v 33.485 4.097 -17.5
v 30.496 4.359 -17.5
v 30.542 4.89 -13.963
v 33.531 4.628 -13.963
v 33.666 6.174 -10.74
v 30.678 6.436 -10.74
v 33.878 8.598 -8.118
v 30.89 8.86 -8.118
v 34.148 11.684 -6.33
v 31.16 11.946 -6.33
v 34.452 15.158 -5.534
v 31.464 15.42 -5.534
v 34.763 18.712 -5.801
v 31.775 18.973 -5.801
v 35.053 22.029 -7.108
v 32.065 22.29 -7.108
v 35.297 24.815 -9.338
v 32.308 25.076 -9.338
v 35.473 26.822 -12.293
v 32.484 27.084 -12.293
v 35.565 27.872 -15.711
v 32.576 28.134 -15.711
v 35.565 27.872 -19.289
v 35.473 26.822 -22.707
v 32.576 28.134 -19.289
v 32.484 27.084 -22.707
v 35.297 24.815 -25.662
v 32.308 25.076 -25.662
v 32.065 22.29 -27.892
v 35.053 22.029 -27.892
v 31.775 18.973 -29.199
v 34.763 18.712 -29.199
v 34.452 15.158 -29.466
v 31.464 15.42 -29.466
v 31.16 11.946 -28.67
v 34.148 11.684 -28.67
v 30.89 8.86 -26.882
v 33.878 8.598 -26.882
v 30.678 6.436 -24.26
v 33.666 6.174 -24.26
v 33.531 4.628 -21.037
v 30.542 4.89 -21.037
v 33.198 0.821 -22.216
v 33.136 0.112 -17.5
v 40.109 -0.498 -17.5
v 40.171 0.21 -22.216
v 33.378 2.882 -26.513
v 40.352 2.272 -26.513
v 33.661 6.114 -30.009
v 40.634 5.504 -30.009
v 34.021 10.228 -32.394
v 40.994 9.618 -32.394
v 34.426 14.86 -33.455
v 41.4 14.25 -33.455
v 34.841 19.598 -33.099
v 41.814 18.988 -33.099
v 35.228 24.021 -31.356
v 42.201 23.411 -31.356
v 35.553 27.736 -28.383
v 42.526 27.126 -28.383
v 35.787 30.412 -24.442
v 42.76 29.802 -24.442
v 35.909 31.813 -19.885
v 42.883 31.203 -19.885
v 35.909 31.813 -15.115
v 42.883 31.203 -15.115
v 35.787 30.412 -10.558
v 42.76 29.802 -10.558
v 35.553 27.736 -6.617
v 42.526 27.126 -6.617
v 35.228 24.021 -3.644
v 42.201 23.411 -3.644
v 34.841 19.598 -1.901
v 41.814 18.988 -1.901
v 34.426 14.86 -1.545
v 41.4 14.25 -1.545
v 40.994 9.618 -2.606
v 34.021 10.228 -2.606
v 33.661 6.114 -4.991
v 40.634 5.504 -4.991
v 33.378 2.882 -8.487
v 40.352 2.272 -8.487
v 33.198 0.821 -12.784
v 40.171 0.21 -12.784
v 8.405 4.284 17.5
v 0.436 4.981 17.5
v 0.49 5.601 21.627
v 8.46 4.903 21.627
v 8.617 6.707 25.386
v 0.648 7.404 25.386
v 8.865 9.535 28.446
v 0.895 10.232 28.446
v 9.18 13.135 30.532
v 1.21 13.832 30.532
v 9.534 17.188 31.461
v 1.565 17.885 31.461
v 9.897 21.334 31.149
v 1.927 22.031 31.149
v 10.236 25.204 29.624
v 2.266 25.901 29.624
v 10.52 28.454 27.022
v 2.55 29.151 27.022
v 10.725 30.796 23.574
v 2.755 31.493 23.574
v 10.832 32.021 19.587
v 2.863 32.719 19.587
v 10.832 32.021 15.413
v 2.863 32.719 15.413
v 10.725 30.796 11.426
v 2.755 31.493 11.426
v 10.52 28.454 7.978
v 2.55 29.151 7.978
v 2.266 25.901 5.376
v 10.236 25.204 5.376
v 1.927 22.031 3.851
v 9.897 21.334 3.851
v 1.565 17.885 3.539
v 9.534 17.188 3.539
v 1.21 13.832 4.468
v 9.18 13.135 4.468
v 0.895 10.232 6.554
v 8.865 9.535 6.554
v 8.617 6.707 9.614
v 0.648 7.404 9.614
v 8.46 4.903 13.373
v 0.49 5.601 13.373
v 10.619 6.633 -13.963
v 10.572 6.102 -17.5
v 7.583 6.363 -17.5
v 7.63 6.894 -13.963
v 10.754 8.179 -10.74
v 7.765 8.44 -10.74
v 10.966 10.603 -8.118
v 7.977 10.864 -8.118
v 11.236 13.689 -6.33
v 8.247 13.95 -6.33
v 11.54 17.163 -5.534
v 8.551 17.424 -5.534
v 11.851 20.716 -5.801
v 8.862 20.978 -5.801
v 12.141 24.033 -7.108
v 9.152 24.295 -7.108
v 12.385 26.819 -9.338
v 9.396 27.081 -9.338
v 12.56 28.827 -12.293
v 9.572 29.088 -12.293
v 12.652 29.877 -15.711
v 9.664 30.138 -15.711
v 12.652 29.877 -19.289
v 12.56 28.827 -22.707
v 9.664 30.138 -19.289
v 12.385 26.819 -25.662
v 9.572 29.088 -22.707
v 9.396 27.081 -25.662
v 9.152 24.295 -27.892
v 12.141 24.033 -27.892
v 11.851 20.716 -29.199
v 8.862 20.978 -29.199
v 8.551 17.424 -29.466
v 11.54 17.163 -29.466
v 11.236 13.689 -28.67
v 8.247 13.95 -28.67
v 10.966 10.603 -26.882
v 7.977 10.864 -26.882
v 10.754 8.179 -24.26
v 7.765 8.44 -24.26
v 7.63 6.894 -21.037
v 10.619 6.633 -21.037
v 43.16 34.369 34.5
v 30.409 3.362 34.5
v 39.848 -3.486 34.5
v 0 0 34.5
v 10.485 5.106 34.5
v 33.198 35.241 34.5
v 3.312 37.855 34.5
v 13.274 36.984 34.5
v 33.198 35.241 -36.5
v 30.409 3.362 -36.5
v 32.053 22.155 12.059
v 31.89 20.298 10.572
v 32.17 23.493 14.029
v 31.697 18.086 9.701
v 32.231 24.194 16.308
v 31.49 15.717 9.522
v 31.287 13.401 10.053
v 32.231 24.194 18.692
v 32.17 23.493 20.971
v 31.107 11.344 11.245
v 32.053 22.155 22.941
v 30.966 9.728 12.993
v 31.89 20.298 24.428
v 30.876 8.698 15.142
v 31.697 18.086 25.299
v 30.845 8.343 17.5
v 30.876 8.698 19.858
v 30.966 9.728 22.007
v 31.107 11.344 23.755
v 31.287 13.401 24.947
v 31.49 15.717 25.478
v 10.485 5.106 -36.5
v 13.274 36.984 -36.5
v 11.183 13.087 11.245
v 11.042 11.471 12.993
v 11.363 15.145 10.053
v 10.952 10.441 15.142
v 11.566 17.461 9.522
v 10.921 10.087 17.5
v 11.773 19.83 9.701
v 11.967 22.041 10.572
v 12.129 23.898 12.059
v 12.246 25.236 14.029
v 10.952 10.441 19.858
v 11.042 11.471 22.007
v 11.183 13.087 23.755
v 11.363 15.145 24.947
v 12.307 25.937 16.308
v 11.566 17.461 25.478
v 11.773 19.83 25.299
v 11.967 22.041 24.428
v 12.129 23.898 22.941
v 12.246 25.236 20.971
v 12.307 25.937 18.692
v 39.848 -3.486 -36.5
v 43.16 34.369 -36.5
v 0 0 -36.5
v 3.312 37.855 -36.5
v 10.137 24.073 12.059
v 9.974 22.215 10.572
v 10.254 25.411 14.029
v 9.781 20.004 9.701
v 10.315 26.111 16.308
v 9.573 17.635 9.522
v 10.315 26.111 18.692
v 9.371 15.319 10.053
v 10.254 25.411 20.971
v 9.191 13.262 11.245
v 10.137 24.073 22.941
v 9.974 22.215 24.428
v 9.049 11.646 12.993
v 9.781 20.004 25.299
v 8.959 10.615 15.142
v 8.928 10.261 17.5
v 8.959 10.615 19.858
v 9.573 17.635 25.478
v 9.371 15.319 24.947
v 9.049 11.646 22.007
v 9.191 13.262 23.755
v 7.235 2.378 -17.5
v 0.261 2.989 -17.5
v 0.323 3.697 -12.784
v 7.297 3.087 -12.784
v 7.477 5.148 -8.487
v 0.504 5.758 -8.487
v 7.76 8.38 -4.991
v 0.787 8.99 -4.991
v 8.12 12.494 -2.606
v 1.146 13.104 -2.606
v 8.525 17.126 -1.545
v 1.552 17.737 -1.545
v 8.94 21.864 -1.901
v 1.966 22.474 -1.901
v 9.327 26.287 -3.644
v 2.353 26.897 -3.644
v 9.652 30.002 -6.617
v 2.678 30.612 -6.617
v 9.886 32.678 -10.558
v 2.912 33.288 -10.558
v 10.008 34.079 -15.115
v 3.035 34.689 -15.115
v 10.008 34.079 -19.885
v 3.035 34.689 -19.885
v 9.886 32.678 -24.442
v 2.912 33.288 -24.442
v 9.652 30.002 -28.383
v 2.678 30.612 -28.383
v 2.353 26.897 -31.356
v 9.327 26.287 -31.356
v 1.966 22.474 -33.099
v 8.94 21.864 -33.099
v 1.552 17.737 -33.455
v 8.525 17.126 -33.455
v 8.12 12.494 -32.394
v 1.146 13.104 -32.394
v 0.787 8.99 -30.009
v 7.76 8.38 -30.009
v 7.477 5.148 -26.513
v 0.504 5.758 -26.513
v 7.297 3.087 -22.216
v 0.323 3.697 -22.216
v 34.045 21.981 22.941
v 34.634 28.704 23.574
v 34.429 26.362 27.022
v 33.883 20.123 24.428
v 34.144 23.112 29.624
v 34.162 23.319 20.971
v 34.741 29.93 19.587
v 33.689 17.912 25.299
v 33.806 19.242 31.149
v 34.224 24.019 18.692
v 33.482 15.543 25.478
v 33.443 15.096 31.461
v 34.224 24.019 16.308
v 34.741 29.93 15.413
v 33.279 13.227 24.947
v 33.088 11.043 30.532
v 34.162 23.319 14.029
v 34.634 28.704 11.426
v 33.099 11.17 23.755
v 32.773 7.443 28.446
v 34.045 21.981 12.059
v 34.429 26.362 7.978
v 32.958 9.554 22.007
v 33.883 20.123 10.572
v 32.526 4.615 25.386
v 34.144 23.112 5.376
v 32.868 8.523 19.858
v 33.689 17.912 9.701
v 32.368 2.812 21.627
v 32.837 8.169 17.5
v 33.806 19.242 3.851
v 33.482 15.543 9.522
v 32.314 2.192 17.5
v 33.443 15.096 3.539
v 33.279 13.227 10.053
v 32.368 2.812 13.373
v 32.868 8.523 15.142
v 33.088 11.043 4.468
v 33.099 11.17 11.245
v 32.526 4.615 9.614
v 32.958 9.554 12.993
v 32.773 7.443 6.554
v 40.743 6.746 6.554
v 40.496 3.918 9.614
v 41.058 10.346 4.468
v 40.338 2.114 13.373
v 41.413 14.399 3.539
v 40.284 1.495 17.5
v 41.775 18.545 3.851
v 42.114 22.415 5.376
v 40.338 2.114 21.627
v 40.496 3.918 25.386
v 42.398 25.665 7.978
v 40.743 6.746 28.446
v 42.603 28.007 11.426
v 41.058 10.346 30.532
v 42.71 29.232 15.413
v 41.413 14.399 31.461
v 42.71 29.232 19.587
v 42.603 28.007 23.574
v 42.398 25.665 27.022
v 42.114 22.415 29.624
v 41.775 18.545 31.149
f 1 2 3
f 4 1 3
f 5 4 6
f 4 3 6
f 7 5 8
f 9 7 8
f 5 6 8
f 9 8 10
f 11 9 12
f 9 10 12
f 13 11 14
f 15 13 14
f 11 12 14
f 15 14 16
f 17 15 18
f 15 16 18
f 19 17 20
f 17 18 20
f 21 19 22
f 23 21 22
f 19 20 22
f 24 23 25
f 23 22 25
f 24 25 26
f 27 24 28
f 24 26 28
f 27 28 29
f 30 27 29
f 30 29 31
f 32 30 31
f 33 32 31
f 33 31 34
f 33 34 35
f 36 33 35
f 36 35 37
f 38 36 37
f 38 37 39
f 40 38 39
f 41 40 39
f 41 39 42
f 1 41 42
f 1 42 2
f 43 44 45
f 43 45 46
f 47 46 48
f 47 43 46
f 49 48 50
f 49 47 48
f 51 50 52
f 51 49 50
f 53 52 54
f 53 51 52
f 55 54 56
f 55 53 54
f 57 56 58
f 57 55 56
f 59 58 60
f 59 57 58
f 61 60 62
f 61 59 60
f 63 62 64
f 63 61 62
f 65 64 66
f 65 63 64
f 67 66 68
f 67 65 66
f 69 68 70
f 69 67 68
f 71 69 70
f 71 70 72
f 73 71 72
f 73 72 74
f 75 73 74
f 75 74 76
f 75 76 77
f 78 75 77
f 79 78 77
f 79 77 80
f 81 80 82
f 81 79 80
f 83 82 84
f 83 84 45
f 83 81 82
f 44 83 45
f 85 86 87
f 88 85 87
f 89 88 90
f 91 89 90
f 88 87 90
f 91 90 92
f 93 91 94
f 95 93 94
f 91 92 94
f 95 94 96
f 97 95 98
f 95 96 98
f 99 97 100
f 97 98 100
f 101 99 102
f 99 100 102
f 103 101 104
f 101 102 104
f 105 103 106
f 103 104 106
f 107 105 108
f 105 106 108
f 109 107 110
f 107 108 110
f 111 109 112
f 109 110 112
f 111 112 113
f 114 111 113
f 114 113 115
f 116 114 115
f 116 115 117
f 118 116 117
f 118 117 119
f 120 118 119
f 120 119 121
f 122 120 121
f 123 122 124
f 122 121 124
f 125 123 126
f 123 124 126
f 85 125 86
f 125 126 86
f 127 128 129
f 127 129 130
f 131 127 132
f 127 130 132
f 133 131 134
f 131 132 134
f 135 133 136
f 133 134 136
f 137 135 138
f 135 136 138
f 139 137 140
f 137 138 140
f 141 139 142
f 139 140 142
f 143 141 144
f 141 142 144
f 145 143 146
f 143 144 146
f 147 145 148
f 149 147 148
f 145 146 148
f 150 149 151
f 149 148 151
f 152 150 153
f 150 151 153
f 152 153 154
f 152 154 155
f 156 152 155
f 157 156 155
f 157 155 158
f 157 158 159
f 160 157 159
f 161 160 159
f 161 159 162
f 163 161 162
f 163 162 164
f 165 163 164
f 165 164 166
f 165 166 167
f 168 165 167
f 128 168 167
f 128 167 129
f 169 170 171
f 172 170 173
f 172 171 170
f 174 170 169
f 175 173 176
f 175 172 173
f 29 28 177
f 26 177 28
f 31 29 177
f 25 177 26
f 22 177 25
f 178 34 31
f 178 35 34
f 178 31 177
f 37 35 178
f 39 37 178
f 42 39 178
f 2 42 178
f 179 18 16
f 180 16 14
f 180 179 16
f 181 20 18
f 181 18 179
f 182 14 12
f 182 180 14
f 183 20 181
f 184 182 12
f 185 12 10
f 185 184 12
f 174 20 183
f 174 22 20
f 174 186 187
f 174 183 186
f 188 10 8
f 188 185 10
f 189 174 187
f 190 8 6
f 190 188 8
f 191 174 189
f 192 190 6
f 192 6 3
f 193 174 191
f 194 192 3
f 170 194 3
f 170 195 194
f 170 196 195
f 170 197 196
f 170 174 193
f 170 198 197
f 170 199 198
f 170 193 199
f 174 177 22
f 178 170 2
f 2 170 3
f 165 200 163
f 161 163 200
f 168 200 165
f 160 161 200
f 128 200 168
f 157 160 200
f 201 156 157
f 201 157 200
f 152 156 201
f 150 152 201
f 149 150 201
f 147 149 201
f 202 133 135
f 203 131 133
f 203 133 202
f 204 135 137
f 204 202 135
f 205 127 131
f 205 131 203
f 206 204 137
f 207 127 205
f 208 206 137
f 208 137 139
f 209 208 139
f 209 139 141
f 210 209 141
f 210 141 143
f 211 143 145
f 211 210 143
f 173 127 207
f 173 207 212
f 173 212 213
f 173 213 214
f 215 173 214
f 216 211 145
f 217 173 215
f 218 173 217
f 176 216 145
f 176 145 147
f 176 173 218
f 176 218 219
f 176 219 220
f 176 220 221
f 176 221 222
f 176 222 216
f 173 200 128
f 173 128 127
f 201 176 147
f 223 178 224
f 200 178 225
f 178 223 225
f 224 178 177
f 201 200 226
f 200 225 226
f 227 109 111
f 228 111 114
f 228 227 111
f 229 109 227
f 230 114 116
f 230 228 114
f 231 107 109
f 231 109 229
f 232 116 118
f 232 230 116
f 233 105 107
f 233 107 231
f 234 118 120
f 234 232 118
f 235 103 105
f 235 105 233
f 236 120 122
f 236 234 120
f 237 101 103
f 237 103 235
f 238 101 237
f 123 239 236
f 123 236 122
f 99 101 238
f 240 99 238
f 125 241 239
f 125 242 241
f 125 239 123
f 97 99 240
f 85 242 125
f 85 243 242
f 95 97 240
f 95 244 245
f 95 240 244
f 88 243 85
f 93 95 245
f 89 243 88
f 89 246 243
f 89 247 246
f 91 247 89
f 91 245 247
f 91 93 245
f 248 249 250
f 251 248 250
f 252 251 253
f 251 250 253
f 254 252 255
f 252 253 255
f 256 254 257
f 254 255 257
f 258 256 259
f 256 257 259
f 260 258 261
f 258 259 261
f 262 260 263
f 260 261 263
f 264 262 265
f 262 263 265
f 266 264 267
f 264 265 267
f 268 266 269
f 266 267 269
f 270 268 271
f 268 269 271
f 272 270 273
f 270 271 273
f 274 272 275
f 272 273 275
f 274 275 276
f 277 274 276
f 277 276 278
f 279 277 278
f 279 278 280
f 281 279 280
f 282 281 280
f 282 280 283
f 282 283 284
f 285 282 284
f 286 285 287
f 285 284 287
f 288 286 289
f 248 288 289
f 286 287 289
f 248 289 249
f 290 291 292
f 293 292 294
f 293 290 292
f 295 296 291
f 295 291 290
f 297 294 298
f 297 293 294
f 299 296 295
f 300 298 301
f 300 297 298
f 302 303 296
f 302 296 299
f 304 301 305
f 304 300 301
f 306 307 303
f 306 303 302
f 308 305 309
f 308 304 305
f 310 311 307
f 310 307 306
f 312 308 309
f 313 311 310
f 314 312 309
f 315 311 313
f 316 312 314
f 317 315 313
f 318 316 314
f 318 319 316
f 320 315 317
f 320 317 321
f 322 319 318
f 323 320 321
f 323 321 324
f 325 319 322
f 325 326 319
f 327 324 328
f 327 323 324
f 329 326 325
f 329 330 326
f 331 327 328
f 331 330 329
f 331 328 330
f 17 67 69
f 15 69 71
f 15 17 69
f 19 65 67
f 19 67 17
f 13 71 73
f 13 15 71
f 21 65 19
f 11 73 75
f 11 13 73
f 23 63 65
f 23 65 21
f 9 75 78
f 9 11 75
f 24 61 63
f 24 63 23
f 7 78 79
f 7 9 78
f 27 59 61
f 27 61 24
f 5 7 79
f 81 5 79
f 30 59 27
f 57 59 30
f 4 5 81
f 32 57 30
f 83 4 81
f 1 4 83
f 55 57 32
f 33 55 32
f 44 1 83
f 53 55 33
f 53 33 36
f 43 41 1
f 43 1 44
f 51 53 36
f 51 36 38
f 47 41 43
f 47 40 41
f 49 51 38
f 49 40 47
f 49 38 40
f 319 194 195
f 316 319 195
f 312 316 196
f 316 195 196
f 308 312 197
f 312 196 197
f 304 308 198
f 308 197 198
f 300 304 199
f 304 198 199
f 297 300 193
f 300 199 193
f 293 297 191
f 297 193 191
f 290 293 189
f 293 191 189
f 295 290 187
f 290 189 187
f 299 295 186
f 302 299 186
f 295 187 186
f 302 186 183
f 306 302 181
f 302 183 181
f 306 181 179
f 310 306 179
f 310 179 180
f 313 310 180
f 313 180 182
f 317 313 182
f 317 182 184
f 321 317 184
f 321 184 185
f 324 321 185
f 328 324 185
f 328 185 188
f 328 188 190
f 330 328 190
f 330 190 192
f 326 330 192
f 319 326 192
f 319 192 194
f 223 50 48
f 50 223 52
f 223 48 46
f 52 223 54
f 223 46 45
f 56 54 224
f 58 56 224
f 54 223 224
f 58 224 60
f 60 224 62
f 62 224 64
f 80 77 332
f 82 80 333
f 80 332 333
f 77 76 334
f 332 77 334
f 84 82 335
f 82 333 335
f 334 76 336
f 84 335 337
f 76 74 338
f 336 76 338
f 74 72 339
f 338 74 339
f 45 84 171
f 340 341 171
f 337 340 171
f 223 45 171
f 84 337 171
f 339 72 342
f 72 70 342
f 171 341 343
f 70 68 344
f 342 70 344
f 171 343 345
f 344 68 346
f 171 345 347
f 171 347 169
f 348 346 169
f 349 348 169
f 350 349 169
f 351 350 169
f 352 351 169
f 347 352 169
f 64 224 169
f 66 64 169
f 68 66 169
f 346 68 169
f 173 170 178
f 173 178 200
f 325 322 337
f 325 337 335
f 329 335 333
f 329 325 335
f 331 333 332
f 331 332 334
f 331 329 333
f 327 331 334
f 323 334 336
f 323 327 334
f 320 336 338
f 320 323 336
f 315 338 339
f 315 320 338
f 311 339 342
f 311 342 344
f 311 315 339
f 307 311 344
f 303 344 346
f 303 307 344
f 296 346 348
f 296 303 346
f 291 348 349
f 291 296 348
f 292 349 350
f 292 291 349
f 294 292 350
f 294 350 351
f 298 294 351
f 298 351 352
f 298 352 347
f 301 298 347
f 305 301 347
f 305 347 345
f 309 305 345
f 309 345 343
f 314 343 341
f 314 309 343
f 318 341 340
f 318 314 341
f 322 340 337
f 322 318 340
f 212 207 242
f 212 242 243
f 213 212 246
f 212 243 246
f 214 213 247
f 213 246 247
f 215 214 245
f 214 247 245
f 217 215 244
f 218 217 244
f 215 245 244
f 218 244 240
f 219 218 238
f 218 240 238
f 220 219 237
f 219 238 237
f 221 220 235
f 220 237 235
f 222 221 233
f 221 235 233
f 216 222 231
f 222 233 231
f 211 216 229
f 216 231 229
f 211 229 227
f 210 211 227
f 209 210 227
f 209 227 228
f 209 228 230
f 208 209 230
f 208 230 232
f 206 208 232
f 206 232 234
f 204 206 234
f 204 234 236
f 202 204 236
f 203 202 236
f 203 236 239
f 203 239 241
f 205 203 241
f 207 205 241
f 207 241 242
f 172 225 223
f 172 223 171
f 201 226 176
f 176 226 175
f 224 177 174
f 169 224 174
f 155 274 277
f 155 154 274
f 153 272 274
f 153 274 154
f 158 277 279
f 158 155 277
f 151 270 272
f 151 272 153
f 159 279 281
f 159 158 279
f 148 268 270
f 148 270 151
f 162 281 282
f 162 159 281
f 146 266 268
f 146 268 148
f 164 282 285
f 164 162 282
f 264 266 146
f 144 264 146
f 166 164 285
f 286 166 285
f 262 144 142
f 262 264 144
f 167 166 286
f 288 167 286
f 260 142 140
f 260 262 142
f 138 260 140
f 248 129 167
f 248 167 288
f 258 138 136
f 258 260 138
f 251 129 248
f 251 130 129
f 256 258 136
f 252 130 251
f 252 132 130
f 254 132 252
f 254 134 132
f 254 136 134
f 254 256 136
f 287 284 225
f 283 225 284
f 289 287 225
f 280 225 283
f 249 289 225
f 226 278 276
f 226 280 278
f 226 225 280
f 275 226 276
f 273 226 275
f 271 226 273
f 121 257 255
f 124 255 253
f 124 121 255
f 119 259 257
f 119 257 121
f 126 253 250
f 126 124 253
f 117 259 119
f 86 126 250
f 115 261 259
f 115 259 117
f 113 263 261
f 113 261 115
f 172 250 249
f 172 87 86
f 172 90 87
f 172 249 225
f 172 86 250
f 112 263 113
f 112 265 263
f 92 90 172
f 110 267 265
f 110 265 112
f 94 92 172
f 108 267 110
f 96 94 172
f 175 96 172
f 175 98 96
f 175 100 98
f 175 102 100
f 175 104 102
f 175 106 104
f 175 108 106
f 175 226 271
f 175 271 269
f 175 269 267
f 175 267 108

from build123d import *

# Parameters (mm, degrees)
SKETCH1_W           = 71
SKETCH1_H           = 38
SKETCH1_R           = 12
SKETCH1_R_2         = 8
BOSS_EXTRUDE1_DEPTH = 40
SKETCH7_R           = 16
CUT_EXTRUDE4_DEPTH  = 7
SKETCH8_R           = 14
CUT_EXTRUDE5_DEPTH  = 8
CUT_EXTRUDE6_START  = -7
SKETCH9_R           = 16
CUT_EXTRUDE6_DEPTH  = 7
CUT_EXTRUDE7_START  = -8
SKETCH10_R          = 14
CUT_EXTRUDE7_DEPTH  = 8
CUT_EXTRUDE8_DEPTH  = 92.306031742


with BuildPart() as part:
    # Sketch1 → Boss-Extrude1 (new body)
    with BuildSketch(Plane(origin=(0, 0, 0), x_dir=(0, 0, 1), z_dir=(-0.9961946980917459, 0.08715574274765504, 0))):
        with Locations((-1, 19)):
            Rectangle(SKETCH1_W, SKETCH1_H)
        with Locations((-17.5, 19)):
            Circle(SKETCH1_R, mode=Mode.SUBTRACT)
        with Locations((17.5, 19)):
            Circle(SKETCH1_R_2, mode=Mode.SUBTRACT)
    extrude(amount=-BOSS_EXTRUDE1_DEPTH)

    # Sketch7 → Cut-Extrude4 (cut)
    with BuildSketch(Plane(origin=(0, 0, 0), x_dir=(0, 0, 1), z_dir=(-0.9961946980917459, 0.08715574274765503, 0))):
        with Locations((-17.5, 19)):
            Circle(SKETCH7_R)
    extrude(amount=-CUT_EXTRUDE4_DEPTH, mode=Mode.SUBTRACT)

    # Sketch8 → Cut-Extrude5 (cut)
    with BuildSketch(Plane(origin=(0, 0, 0), x_dir=(0, 0, 1), z_dir=(-0.9961946980917459, 0.08715574274765503, 0))):
        with Locations((17.5, 19)):
            Circle(SKETCH8_R)
    extrude(amount=-CUT_EXTRUDE5_DEPTH, mode=Mode.SUBTRACT)

    # Sketch9 → Cut-Extrude6 (cut)
    with BuildSketch(Plane(origin=(39.847787924, -3.48622971, 0), x_dir=(0, 0, -1), z_dir=(0.9961946980917459, -0.08715574274765503, 0)).offset(CUT_EXTRUDE6_START)):
        with Locations((17.5, 19)):
            Circle(SKETCH9_R)
    extrude(amount=CUT_EXTRUDE6_DEPTH, mode=Mode.SUBTRACT)

    # Sketch10 → Cut-Extrude7 (cut)
    with BuildSketch(Plane(origin=(39.847787924, -3.48622971, 0), x_dir=(0, 0, -1), z_dir=(0.9961946980917459, -0.08715574274765503, 0)).offset(CUT_EXTRUDE7_START)):
        with Locations((-17.5, 19)):
            Circle(SKETCH10_R)
    extrude(amount=CUT_EXTRUDE7_DEPTH, mode=Mode.SUBTRACT)

    # Sketch11 → Cut-Extrude8 (cut, through all)
    with BuildSketch(Plane.XY.offset(34.5)):
        Polygon((13.273865205, 36.9838411), (33.197759167, 35.240726245), (30.408775399, 3.362495906), (10.484881437, 5.105610761), align=None)
    extrude(amount=-CUT_EXTRUDE8_DEPTH, mode=Mode.SUBTRACT)


solid = part.part
